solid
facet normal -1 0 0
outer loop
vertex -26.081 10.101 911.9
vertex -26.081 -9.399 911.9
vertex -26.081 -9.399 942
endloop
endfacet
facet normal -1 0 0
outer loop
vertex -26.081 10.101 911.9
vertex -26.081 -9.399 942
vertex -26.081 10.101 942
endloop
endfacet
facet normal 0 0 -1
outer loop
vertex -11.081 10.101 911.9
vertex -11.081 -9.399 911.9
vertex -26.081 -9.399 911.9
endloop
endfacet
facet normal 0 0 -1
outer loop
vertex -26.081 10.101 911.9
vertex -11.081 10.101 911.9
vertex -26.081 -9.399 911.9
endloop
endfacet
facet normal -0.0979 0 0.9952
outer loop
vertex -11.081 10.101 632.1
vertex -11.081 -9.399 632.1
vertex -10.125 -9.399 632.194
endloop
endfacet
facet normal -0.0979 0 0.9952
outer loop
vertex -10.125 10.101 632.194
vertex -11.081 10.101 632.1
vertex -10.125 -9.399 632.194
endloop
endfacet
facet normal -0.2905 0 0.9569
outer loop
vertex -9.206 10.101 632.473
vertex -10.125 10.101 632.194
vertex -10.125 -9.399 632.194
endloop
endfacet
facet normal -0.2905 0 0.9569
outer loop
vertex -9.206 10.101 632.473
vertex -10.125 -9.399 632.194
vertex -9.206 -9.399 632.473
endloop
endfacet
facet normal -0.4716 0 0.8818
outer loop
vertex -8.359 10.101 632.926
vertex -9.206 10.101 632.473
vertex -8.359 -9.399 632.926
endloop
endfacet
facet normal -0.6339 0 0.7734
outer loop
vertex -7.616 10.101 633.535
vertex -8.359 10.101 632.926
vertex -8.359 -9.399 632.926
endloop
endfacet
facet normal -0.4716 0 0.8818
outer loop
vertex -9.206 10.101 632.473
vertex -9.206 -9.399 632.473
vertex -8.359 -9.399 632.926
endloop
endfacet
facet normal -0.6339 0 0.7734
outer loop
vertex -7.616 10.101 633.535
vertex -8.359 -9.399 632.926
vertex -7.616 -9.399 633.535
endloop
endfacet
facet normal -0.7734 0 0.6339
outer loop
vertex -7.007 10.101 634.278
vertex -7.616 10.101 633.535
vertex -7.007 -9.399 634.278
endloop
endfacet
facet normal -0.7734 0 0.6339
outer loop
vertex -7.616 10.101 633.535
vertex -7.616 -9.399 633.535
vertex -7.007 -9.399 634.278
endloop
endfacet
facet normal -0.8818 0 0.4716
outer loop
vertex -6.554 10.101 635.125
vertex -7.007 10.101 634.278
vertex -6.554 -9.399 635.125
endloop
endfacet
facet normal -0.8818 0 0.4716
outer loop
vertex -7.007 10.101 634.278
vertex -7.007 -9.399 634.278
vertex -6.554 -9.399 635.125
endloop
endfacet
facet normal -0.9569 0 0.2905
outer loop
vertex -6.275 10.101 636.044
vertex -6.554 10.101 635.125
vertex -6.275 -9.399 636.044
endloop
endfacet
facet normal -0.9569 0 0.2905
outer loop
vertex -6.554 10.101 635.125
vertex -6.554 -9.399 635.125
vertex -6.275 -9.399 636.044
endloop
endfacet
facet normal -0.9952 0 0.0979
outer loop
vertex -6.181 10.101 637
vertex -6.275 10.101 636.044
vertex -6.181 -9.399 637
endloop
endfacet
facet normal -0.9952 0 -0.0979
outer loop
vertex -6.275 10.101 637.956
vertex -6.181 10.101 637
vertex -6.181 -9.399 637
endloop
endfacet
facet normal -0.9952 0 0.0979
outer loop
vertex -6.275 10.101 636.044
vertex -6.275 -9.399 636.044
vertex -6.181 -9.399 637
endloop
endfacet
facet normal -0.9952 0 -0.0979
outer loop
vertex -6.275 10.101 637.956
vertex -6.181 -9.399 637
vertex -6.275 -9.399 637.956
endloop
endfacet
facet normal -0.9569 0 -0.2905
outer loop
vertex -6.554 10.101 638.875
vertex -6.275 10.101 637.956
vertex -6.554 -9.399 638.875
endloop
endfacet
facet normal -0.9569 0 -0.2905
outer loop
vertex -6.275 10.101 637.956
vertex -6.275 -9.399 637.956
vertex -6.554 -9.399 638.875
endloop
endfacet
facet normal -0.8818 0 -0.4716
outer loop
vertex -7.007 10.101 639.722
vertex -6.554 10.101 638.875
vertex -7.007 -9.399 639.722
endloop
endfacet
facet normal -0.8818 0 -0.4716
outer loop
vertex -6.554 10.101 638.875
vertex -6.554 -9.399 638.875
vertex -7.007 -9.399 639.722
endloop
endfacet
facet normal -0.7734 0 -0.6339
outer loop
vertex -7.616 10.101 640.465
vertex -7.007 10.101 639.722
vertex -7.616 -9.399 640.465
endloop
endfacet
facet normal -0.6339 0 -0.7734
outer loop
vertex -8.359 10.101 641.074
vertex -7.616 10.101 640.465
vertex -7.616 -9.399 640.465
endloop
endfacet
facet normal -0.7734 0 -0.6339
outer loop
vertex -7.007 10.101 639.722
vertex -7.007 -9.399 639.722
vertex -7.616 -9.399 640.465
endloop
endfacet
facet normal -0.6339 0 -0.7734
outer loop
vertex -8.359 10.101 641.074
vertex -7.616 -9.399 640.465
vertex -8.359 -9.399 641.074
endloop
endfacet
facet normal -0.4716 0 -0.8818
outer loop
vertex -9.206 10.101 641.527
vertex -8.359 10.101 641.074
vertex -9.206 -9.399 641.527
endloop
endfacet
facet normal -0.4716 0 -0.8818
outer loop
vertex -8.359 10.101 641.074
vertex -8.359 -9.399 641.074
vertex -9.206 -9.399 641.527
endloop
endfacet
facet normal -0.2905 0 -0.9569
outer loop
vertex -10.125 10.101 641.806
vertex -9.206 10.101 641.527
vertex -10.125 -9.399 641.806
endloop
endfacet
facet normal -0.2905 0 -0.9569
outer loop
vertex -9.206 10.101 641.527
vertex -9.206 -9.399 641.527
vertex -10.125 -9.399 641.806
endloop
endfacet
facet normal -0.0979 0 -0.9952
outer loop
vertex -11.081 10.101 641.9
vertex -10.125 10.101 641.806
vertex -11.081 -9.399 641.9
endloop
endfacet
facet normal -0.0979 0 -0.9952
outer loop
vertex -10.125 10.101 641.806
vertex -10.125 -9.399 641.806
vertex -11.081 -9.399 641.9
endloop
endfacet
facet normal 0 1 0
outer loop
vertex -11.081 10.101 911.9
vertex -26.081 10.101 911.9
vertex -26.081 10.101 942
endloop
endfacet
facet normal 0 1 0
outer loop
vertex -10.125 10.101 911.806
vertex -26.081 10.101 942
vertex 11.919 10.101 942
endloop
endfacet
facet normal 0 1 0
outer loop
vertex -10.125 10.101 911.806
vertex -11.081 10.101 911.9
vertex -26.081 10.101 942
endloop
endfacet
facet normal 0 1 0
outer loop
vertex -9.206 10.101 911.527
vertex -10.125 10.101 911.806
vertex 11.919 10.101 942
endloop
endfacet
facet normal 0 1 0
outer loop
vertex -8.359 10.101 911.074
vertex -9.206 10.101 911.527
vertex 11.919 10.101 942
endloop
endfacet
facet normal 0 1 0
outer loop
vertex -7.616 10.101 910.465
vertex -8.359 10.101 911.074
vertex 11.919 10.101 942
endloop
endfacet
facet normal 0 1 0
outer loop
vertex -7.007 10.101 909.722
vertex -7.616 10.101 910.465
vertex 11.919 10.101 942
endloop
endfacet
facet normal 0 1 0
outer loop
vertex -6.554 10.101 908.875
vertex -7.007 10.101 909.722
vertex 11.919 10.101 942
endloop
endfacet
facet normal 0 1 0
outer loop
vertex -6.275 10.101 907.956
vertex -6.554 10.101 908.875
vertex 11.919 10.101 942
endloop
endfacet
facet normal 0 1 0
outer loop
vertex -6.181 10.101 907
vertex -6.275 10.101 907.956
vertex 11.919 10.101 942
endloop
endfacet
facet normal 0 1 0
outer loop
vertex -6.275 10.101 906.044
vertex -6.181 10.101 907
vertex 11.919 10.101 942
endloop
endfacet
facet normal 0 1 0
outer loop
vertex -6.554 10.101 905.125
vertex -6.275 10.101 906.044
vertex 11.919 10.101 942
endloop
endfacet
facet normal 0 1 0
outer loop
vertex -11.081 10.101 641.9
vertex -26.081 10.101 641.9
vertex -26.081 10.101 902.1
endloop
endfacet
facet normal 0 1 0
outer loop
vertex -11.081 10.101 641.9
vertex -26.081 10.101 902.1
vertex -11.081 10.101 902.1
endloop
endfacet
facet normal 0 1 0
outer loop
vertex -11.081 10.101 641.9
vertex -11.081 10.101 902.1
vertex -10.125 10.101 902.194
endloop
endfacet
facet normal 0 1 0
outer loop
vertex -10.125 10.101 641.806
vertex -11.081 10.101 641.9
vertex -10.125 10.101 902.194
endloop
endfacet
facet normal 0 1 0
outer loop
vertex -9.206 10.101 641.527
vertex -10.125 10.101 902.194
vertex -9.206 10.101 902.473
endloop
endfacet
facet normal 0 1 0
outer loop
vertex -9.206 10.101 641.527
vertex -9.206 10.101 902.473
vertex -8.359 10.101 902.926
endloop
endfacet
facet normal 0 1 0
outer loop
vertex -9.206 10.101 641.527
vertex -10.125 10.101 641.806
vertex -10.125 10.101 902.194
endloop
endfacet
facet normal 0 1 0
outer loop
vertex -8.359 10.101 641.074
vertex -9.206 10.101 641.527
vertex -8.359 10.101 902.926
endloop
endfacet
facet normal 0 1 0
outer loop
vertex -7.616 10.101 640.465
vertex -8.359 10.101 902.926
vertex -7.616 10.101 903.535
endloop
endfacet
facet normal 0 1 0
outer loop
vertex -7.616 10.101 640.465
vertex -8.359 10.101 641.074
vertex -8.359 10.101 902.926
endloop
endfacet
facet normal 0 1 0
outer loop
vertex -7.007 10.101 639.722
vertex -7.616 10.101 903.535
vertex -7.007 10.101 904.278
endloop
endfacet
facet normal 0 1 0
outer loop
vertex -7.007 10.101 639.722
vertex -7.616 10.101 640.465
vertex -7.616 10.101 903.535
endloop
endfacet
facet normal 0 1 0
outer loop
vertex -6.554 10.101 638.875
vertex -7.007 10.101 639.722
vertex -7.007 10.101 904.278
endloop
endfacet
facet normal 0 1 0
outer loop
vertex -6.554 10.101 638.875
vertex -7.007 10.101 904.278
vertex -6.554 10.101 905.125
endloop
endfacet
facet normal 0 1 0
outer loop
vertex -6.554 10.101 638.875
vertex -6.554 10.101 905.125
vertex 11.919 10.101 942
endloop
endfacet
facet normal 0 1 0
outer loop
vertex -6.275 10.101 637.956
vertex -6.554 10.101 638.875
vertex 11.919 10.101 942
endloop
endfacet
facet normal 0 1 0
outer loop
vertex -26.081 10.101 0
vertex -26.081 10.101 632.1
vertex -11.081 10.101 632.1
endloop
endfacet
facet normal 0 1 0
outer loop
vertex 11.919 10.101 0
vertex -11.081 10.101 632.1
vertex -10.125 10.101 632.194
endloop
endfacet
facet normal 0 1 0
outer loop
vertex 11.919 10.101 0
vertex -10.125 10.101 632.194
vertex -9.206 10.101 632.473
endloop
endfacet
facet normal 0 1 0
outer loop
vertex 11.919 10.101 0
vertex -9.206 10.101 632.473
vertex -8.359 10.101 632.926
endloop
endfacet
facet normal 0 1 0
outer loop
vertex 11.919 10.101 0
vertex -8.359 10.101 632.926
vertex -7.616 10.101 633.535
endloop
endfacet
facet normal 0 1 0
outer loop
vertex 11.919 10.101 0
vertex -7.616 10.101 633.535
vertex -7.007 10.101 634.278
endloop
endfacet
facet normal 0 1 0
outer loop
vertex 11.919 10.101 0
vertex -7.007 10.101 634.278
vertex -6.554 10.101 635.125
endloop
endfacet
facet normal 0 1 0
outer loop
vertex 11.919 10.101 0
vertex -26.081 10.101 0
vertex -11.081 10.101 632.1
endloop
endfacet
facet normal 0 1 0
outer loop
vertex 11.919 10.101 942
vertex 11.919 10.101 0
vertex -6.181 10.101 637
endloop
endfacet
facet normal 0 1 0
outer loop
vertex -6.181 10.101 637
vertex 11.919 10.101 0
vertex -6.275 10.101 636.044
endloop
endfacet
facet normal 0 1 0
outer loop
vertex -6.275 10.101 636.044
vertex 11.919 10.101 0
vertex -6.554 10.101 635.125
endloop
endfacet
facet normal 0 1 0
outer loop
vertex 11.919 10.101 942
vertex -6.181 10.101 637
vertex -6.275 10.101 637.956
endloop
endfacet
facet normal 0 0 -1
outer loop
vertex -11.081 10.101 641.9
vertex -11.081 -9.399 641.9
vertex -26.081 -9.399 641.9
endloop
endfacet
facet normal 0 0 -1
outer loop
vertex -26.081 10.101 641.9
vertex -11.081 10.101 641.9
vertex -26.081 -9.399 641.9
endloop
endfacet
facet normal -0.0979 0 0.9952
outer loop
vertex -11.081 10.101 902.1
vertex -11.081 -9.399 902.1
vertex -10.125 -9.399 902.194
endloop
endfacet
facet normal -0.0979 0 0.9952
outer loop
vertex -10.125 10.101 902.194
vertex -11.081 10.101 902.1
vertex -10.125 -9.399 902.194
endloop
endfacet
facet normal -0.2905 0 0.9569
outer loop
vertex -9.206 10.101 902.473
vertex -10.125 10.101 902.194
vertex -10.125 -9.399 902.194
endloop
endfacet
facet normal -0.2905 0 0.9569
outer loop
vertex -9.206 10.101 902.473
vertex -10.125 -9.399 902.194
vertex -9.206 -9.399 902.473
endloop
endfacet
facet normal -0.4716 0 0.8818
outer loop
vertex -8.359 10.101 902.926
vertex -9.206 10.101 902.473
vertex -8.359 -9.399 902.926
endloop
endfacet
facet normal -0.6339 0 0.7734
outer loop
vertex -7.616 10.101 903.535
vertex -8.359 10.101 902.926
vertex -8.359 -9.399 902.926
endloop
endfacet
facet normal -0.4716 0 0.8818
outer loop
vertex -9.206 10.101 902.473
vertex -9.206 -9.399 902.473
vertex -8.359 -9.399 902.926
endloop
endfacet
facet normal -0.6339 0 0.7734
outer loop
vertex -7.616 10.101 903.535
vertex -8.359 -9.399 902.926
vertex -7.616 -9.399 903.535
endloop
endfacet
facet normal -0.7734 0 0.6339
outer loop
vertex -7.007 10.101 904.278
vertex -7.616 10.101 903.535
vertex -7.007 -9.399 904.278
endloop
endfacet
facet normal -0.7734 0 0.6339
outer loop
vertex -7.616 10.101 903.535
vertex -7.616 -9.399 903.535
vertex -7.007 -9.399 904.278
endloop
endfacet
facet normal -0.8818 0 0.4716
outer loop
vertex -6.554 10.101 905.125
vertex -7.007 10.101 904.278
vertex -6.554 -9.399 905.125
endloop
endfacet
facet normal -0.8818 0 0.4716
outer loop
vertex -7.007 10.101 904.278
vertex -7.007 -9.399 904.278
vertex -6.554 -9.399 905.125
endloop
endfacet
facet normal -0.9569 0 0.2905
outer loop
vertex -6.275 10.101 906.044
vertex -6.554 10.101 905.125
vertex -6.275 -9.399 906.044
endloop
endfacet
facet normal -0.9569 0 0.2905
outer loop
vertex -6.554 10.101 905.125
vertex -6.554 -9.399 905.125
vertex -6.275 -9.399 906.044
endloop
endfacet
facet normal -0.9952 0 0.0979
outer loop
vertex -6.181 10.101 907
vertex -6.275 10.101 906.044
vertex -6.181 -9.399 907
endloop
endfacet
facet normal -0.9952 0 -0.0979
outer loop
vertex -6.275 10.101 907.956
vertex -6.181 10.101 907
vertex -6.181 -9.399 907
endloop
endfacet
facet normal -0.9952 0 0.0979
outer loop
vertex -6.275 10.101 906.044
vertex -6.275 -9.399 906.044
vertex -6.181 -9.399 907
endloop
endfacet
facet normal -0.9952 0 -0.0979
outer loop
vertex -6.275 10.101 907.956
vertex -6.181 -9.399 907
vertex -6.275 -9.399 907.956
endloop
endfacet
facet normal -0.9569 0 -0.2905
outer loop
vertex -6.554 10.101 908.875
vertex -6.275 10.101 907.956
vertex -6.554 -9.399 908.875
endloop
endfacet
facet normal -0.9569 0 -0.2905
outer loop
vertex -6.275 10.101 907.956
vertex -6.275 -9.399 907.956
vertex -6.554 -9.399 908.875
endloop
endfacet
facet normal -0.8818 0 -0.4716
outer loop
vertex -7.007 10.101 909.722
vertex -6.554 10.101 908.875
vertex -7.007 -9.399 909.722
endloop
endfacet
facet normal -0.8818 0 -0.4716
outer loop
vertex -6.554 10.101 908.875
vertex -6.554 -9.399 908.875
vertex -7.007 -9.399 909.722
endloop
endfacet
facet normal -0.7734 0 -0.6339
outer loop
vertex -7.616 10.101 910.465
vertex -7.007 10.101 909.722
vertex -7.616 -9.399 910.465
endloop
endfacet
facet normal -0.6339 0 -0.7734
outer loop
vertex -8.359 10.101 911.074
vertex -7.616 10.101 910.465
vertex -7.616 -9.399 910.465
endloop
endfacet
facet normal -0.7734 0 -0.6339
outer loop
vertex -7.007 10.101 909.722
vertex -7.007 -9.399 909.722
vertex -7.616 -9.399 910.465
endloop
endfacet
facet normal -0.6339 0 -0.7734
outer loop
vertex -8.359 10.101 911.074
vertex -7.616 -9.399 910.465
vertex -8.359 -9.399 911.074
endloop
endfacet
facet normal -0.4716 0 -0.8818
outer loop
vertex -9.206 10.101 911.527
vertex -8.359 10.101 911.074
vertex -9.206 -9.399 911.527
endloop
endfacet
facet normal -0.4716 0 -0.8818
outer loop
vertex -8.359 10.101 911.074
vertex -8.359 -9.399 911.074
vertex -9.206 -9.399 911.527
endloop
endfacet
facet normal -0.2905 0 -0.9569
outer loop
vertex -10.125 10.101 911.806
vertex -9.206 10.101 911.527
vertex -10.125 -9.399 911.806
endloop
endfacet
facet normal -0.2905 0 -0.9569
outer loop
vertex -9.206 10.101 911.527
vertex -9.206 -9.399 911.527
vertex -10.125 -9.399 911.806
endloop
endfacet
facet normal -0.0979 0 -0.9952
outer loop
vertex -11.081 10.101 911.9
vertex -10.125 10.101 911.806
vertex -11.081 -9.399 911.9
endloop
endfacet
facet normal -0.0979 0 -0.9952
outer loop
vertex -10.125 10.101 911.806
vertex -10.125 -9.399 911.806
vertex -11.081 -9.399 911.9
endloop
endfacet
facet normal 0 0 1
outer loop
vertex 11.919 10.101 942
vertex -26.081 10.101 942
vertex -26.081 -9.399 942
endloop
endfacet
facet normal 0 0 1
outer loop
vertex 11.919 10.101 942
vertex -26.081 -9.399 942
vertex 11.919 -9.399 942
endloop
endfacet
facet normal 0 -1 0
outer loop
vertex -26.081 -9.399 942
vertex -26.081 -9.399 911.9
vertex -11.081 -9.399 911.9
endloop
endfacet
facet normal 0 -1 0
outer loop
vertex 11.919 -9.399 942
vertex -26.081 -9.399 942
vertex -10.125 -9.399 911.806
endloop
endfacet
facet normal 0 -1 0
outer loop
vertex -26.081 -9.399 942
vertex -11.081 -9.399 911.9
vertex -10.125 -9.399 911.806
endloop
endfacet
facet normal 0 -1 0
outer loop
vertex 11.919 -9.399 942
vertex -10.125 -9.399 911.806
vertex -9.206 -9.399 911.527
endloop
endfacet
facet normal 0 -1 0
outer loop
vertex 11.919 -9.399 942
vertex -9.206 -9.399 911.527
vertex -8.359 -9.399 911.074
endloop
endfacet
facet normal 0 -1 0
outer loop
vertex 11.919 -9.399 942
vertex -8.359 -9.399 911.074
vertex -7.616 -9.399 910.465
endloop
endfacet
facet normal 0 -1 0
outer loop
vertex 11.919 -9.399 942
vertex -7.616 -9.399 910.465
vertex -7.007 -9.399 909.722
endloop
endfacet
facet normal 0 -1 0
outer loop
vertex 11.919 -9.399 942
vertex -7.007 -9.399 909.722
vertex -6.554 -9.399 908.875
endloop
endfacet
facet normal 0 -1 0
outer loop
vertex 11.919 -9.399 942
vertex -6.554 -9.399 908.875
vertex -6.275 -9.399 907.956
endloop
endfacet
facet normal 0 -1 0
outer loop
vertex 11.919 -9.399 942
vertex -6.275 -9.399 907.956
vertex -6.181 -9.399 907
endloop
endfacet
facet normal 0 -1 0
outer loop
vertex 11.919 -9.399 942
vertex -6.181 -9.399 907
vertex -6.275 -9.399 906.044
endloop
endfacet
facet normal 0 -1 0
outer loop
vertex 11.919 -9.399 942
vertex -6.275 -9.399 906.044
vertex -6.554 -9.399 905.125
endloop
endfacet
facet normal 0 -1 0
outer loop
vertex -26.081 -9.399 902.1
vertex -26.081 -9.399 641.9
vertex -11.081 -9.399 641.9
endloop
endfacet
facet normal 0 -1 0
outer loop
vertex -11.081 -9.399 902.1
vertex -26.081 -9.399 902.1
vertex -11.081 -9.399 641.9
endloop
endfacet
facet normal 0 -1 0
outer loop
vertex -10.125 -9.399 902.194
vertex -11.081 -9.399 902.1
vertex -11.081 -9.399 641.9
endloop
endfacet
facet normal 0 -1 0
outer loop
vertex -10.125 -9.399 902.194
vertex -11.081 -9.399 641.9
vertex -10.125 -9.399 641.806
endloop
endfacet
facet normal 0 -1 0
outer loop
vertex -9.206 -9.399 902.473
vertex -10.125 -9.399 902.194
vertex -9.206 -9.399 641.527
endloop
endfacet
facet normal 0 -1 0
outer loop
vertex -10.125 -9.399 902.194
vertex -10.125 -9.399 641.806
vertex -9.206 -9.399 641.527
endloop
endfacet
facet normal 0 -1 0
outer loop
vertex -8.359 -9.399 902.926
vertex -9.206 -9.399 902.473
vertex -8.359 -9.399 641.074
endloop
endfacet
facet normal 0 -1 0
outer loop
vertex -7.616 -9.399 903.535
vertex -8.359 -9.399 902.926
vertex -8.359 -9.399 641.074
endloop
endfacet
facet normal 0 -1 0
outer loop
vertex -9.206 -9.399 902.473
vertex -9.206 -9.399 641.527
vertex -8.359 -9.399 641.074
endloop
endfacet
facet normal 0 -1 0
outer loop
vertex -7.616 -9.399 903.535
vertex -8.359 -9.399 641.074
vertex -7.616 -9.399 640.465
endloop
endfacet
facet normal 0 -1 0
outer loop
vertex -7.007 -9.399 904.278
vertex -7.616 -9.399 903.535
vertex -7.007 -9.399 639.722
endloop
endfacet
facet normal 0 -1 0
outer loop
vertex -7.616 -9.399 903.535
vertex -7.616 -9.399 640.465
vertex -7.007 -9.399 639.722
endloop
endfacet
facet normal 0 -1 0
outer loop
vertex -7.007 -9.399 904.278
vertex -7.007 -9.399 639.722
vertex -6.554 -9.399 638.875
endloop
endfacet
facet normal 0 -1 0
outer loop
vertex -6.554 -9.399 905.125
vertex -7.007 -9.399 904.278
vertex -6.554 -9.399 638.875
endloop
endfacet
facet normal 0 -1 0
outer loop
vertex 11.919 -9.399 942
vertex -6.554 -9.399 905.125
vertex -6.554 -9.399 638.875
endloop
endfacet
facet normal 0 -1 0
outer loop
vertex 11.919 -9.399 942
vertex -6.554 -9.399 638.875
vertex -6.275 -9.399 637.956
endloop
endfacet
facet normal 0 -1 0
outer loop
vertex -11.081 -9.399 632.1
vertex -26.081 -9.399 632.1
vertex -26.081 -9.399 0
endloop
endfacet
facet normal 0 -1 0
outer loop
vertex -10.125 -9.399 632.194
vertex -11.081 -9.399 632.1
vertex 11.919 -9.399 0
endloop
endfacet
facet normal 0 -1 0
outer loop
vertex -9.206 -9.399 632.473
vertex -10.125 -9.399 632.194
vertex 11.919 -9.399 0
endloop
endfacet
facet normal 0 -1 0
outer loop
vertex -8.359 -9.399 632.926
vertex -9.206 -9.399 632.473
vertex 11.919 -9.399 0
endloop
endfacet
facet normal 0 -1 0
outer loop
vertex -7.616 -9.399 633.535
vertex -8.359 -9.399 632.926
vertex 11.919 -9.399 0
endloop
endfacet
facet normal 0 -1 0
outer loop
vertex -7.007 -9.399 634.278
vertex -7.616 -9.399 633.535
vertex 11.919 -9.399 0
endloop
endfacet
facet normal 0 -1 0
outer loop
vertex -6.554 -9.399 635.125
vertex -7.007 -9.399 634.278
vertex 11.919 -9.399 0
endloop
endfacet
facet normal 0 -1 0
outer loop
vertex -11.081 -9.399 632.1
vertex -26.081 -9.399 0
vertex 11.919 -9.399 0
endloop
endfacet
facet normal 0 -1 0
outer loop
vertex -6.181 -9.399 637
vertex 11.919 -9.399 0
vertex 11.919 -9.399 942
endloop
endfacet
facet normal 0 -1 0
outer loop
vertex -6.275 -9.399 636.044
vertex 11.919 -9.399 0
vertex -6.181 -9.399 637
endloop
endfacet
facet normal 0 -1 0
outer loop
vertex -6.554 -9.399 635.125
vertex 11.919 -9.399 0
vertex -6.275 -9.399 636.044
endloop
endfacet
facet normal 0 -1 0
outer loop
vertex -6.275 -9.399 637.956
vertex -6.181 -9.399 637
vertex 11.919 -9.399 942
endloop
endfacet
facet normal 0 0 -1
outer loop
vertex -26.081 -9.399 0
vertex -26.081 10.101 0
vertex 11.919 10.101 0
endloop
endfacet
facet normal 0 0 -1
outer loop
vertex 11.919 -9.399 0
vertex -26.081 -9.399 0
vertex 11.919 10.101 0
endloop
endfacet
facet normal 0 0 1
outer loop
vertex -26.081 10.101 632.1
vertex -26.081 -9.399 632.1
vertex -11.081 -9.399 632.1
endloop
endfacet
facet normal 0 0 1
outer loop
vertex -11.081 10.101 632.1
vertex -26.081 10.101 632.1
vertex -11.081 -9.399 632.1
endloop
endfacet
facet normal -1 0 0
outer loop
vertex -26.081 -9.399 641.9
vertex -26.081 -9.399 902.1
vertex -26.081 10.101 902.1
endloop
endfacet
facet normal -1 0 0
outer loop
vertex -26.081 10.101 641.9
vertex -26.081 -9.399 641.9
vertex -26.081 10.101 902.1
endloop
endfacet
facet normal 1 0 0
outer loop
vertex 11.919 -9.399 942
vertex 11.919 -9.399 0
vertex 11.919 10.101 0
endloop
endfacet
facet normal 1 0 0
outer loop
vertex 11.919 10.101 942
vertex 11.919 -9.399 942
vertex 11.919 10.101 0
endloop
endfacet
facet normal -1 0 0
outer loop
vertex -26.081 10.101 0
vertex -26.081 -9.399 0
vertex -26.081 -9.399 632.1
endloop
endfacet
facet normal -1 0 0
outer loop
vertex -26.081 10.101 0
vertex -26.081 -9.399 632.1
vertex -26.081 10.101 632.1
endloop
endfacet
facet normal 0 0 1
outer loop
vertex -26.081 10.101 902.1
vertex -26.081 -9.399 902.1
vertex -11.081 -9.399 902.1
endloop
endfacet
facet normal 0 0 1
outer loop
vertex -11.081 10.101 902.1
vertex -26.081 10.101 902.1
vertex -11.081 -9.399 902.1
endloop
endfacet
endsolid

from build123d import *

# Parameters (mm, degrees)
SKETCH1_W           = 38
SKETCH1_H           = 19.5
BOSS_EXTRUDE1_DEPTH = 942
CUT_EXTRUDE1_DEPTH  = 61


with BuildPart() as part:
    # Sketch1 → Boss-Extrude1 (new body)
    with BuildSketch(Plane.XY):
        with Locations((-7.080898876, 0.350561798)):
            Rectangle(SKETCH1_W, SKETCH1_H)
    extrude(amount=BOSS_EXTRUDE1_DEPTH)

    # Sketch2 → Cut-Extrude1 (cut)
    with BuildSketch(Plane.XZ.offset(9.399438202)):
        with BuildLine():
            Line((-11.080898876, 911.9), (-32.643906923, 911.9))
            Line((-32.643906923, 911.9), (-32.643906923, 902.1))
            Line((-32.643906923, 902.1), (-11.080898876, 902.1))
            ThreePointArc((-11.080898876, 902.1), (-6.180898876, 907), (-11.080898876, 911.9))
        make_face()
        with BuildLine():
            Line((-11.080898876, 641.9), (-28.706990063, 641.9))
            Line((-28.706990063, 641.9), (-28.706990063, 632.1))
            Line((-28.706990063, 632.1), (-11.080898876, 632.1))
            ThreePointArc((-11.080898876, 632.1), (-6.180898876, 637), (-11.080898876, 641.9))
        make_face()
    extrude(amount=-CUT_EXTRUDE1_DEPTH, mode=Mode.SUBTRACT)


solid = part.part
